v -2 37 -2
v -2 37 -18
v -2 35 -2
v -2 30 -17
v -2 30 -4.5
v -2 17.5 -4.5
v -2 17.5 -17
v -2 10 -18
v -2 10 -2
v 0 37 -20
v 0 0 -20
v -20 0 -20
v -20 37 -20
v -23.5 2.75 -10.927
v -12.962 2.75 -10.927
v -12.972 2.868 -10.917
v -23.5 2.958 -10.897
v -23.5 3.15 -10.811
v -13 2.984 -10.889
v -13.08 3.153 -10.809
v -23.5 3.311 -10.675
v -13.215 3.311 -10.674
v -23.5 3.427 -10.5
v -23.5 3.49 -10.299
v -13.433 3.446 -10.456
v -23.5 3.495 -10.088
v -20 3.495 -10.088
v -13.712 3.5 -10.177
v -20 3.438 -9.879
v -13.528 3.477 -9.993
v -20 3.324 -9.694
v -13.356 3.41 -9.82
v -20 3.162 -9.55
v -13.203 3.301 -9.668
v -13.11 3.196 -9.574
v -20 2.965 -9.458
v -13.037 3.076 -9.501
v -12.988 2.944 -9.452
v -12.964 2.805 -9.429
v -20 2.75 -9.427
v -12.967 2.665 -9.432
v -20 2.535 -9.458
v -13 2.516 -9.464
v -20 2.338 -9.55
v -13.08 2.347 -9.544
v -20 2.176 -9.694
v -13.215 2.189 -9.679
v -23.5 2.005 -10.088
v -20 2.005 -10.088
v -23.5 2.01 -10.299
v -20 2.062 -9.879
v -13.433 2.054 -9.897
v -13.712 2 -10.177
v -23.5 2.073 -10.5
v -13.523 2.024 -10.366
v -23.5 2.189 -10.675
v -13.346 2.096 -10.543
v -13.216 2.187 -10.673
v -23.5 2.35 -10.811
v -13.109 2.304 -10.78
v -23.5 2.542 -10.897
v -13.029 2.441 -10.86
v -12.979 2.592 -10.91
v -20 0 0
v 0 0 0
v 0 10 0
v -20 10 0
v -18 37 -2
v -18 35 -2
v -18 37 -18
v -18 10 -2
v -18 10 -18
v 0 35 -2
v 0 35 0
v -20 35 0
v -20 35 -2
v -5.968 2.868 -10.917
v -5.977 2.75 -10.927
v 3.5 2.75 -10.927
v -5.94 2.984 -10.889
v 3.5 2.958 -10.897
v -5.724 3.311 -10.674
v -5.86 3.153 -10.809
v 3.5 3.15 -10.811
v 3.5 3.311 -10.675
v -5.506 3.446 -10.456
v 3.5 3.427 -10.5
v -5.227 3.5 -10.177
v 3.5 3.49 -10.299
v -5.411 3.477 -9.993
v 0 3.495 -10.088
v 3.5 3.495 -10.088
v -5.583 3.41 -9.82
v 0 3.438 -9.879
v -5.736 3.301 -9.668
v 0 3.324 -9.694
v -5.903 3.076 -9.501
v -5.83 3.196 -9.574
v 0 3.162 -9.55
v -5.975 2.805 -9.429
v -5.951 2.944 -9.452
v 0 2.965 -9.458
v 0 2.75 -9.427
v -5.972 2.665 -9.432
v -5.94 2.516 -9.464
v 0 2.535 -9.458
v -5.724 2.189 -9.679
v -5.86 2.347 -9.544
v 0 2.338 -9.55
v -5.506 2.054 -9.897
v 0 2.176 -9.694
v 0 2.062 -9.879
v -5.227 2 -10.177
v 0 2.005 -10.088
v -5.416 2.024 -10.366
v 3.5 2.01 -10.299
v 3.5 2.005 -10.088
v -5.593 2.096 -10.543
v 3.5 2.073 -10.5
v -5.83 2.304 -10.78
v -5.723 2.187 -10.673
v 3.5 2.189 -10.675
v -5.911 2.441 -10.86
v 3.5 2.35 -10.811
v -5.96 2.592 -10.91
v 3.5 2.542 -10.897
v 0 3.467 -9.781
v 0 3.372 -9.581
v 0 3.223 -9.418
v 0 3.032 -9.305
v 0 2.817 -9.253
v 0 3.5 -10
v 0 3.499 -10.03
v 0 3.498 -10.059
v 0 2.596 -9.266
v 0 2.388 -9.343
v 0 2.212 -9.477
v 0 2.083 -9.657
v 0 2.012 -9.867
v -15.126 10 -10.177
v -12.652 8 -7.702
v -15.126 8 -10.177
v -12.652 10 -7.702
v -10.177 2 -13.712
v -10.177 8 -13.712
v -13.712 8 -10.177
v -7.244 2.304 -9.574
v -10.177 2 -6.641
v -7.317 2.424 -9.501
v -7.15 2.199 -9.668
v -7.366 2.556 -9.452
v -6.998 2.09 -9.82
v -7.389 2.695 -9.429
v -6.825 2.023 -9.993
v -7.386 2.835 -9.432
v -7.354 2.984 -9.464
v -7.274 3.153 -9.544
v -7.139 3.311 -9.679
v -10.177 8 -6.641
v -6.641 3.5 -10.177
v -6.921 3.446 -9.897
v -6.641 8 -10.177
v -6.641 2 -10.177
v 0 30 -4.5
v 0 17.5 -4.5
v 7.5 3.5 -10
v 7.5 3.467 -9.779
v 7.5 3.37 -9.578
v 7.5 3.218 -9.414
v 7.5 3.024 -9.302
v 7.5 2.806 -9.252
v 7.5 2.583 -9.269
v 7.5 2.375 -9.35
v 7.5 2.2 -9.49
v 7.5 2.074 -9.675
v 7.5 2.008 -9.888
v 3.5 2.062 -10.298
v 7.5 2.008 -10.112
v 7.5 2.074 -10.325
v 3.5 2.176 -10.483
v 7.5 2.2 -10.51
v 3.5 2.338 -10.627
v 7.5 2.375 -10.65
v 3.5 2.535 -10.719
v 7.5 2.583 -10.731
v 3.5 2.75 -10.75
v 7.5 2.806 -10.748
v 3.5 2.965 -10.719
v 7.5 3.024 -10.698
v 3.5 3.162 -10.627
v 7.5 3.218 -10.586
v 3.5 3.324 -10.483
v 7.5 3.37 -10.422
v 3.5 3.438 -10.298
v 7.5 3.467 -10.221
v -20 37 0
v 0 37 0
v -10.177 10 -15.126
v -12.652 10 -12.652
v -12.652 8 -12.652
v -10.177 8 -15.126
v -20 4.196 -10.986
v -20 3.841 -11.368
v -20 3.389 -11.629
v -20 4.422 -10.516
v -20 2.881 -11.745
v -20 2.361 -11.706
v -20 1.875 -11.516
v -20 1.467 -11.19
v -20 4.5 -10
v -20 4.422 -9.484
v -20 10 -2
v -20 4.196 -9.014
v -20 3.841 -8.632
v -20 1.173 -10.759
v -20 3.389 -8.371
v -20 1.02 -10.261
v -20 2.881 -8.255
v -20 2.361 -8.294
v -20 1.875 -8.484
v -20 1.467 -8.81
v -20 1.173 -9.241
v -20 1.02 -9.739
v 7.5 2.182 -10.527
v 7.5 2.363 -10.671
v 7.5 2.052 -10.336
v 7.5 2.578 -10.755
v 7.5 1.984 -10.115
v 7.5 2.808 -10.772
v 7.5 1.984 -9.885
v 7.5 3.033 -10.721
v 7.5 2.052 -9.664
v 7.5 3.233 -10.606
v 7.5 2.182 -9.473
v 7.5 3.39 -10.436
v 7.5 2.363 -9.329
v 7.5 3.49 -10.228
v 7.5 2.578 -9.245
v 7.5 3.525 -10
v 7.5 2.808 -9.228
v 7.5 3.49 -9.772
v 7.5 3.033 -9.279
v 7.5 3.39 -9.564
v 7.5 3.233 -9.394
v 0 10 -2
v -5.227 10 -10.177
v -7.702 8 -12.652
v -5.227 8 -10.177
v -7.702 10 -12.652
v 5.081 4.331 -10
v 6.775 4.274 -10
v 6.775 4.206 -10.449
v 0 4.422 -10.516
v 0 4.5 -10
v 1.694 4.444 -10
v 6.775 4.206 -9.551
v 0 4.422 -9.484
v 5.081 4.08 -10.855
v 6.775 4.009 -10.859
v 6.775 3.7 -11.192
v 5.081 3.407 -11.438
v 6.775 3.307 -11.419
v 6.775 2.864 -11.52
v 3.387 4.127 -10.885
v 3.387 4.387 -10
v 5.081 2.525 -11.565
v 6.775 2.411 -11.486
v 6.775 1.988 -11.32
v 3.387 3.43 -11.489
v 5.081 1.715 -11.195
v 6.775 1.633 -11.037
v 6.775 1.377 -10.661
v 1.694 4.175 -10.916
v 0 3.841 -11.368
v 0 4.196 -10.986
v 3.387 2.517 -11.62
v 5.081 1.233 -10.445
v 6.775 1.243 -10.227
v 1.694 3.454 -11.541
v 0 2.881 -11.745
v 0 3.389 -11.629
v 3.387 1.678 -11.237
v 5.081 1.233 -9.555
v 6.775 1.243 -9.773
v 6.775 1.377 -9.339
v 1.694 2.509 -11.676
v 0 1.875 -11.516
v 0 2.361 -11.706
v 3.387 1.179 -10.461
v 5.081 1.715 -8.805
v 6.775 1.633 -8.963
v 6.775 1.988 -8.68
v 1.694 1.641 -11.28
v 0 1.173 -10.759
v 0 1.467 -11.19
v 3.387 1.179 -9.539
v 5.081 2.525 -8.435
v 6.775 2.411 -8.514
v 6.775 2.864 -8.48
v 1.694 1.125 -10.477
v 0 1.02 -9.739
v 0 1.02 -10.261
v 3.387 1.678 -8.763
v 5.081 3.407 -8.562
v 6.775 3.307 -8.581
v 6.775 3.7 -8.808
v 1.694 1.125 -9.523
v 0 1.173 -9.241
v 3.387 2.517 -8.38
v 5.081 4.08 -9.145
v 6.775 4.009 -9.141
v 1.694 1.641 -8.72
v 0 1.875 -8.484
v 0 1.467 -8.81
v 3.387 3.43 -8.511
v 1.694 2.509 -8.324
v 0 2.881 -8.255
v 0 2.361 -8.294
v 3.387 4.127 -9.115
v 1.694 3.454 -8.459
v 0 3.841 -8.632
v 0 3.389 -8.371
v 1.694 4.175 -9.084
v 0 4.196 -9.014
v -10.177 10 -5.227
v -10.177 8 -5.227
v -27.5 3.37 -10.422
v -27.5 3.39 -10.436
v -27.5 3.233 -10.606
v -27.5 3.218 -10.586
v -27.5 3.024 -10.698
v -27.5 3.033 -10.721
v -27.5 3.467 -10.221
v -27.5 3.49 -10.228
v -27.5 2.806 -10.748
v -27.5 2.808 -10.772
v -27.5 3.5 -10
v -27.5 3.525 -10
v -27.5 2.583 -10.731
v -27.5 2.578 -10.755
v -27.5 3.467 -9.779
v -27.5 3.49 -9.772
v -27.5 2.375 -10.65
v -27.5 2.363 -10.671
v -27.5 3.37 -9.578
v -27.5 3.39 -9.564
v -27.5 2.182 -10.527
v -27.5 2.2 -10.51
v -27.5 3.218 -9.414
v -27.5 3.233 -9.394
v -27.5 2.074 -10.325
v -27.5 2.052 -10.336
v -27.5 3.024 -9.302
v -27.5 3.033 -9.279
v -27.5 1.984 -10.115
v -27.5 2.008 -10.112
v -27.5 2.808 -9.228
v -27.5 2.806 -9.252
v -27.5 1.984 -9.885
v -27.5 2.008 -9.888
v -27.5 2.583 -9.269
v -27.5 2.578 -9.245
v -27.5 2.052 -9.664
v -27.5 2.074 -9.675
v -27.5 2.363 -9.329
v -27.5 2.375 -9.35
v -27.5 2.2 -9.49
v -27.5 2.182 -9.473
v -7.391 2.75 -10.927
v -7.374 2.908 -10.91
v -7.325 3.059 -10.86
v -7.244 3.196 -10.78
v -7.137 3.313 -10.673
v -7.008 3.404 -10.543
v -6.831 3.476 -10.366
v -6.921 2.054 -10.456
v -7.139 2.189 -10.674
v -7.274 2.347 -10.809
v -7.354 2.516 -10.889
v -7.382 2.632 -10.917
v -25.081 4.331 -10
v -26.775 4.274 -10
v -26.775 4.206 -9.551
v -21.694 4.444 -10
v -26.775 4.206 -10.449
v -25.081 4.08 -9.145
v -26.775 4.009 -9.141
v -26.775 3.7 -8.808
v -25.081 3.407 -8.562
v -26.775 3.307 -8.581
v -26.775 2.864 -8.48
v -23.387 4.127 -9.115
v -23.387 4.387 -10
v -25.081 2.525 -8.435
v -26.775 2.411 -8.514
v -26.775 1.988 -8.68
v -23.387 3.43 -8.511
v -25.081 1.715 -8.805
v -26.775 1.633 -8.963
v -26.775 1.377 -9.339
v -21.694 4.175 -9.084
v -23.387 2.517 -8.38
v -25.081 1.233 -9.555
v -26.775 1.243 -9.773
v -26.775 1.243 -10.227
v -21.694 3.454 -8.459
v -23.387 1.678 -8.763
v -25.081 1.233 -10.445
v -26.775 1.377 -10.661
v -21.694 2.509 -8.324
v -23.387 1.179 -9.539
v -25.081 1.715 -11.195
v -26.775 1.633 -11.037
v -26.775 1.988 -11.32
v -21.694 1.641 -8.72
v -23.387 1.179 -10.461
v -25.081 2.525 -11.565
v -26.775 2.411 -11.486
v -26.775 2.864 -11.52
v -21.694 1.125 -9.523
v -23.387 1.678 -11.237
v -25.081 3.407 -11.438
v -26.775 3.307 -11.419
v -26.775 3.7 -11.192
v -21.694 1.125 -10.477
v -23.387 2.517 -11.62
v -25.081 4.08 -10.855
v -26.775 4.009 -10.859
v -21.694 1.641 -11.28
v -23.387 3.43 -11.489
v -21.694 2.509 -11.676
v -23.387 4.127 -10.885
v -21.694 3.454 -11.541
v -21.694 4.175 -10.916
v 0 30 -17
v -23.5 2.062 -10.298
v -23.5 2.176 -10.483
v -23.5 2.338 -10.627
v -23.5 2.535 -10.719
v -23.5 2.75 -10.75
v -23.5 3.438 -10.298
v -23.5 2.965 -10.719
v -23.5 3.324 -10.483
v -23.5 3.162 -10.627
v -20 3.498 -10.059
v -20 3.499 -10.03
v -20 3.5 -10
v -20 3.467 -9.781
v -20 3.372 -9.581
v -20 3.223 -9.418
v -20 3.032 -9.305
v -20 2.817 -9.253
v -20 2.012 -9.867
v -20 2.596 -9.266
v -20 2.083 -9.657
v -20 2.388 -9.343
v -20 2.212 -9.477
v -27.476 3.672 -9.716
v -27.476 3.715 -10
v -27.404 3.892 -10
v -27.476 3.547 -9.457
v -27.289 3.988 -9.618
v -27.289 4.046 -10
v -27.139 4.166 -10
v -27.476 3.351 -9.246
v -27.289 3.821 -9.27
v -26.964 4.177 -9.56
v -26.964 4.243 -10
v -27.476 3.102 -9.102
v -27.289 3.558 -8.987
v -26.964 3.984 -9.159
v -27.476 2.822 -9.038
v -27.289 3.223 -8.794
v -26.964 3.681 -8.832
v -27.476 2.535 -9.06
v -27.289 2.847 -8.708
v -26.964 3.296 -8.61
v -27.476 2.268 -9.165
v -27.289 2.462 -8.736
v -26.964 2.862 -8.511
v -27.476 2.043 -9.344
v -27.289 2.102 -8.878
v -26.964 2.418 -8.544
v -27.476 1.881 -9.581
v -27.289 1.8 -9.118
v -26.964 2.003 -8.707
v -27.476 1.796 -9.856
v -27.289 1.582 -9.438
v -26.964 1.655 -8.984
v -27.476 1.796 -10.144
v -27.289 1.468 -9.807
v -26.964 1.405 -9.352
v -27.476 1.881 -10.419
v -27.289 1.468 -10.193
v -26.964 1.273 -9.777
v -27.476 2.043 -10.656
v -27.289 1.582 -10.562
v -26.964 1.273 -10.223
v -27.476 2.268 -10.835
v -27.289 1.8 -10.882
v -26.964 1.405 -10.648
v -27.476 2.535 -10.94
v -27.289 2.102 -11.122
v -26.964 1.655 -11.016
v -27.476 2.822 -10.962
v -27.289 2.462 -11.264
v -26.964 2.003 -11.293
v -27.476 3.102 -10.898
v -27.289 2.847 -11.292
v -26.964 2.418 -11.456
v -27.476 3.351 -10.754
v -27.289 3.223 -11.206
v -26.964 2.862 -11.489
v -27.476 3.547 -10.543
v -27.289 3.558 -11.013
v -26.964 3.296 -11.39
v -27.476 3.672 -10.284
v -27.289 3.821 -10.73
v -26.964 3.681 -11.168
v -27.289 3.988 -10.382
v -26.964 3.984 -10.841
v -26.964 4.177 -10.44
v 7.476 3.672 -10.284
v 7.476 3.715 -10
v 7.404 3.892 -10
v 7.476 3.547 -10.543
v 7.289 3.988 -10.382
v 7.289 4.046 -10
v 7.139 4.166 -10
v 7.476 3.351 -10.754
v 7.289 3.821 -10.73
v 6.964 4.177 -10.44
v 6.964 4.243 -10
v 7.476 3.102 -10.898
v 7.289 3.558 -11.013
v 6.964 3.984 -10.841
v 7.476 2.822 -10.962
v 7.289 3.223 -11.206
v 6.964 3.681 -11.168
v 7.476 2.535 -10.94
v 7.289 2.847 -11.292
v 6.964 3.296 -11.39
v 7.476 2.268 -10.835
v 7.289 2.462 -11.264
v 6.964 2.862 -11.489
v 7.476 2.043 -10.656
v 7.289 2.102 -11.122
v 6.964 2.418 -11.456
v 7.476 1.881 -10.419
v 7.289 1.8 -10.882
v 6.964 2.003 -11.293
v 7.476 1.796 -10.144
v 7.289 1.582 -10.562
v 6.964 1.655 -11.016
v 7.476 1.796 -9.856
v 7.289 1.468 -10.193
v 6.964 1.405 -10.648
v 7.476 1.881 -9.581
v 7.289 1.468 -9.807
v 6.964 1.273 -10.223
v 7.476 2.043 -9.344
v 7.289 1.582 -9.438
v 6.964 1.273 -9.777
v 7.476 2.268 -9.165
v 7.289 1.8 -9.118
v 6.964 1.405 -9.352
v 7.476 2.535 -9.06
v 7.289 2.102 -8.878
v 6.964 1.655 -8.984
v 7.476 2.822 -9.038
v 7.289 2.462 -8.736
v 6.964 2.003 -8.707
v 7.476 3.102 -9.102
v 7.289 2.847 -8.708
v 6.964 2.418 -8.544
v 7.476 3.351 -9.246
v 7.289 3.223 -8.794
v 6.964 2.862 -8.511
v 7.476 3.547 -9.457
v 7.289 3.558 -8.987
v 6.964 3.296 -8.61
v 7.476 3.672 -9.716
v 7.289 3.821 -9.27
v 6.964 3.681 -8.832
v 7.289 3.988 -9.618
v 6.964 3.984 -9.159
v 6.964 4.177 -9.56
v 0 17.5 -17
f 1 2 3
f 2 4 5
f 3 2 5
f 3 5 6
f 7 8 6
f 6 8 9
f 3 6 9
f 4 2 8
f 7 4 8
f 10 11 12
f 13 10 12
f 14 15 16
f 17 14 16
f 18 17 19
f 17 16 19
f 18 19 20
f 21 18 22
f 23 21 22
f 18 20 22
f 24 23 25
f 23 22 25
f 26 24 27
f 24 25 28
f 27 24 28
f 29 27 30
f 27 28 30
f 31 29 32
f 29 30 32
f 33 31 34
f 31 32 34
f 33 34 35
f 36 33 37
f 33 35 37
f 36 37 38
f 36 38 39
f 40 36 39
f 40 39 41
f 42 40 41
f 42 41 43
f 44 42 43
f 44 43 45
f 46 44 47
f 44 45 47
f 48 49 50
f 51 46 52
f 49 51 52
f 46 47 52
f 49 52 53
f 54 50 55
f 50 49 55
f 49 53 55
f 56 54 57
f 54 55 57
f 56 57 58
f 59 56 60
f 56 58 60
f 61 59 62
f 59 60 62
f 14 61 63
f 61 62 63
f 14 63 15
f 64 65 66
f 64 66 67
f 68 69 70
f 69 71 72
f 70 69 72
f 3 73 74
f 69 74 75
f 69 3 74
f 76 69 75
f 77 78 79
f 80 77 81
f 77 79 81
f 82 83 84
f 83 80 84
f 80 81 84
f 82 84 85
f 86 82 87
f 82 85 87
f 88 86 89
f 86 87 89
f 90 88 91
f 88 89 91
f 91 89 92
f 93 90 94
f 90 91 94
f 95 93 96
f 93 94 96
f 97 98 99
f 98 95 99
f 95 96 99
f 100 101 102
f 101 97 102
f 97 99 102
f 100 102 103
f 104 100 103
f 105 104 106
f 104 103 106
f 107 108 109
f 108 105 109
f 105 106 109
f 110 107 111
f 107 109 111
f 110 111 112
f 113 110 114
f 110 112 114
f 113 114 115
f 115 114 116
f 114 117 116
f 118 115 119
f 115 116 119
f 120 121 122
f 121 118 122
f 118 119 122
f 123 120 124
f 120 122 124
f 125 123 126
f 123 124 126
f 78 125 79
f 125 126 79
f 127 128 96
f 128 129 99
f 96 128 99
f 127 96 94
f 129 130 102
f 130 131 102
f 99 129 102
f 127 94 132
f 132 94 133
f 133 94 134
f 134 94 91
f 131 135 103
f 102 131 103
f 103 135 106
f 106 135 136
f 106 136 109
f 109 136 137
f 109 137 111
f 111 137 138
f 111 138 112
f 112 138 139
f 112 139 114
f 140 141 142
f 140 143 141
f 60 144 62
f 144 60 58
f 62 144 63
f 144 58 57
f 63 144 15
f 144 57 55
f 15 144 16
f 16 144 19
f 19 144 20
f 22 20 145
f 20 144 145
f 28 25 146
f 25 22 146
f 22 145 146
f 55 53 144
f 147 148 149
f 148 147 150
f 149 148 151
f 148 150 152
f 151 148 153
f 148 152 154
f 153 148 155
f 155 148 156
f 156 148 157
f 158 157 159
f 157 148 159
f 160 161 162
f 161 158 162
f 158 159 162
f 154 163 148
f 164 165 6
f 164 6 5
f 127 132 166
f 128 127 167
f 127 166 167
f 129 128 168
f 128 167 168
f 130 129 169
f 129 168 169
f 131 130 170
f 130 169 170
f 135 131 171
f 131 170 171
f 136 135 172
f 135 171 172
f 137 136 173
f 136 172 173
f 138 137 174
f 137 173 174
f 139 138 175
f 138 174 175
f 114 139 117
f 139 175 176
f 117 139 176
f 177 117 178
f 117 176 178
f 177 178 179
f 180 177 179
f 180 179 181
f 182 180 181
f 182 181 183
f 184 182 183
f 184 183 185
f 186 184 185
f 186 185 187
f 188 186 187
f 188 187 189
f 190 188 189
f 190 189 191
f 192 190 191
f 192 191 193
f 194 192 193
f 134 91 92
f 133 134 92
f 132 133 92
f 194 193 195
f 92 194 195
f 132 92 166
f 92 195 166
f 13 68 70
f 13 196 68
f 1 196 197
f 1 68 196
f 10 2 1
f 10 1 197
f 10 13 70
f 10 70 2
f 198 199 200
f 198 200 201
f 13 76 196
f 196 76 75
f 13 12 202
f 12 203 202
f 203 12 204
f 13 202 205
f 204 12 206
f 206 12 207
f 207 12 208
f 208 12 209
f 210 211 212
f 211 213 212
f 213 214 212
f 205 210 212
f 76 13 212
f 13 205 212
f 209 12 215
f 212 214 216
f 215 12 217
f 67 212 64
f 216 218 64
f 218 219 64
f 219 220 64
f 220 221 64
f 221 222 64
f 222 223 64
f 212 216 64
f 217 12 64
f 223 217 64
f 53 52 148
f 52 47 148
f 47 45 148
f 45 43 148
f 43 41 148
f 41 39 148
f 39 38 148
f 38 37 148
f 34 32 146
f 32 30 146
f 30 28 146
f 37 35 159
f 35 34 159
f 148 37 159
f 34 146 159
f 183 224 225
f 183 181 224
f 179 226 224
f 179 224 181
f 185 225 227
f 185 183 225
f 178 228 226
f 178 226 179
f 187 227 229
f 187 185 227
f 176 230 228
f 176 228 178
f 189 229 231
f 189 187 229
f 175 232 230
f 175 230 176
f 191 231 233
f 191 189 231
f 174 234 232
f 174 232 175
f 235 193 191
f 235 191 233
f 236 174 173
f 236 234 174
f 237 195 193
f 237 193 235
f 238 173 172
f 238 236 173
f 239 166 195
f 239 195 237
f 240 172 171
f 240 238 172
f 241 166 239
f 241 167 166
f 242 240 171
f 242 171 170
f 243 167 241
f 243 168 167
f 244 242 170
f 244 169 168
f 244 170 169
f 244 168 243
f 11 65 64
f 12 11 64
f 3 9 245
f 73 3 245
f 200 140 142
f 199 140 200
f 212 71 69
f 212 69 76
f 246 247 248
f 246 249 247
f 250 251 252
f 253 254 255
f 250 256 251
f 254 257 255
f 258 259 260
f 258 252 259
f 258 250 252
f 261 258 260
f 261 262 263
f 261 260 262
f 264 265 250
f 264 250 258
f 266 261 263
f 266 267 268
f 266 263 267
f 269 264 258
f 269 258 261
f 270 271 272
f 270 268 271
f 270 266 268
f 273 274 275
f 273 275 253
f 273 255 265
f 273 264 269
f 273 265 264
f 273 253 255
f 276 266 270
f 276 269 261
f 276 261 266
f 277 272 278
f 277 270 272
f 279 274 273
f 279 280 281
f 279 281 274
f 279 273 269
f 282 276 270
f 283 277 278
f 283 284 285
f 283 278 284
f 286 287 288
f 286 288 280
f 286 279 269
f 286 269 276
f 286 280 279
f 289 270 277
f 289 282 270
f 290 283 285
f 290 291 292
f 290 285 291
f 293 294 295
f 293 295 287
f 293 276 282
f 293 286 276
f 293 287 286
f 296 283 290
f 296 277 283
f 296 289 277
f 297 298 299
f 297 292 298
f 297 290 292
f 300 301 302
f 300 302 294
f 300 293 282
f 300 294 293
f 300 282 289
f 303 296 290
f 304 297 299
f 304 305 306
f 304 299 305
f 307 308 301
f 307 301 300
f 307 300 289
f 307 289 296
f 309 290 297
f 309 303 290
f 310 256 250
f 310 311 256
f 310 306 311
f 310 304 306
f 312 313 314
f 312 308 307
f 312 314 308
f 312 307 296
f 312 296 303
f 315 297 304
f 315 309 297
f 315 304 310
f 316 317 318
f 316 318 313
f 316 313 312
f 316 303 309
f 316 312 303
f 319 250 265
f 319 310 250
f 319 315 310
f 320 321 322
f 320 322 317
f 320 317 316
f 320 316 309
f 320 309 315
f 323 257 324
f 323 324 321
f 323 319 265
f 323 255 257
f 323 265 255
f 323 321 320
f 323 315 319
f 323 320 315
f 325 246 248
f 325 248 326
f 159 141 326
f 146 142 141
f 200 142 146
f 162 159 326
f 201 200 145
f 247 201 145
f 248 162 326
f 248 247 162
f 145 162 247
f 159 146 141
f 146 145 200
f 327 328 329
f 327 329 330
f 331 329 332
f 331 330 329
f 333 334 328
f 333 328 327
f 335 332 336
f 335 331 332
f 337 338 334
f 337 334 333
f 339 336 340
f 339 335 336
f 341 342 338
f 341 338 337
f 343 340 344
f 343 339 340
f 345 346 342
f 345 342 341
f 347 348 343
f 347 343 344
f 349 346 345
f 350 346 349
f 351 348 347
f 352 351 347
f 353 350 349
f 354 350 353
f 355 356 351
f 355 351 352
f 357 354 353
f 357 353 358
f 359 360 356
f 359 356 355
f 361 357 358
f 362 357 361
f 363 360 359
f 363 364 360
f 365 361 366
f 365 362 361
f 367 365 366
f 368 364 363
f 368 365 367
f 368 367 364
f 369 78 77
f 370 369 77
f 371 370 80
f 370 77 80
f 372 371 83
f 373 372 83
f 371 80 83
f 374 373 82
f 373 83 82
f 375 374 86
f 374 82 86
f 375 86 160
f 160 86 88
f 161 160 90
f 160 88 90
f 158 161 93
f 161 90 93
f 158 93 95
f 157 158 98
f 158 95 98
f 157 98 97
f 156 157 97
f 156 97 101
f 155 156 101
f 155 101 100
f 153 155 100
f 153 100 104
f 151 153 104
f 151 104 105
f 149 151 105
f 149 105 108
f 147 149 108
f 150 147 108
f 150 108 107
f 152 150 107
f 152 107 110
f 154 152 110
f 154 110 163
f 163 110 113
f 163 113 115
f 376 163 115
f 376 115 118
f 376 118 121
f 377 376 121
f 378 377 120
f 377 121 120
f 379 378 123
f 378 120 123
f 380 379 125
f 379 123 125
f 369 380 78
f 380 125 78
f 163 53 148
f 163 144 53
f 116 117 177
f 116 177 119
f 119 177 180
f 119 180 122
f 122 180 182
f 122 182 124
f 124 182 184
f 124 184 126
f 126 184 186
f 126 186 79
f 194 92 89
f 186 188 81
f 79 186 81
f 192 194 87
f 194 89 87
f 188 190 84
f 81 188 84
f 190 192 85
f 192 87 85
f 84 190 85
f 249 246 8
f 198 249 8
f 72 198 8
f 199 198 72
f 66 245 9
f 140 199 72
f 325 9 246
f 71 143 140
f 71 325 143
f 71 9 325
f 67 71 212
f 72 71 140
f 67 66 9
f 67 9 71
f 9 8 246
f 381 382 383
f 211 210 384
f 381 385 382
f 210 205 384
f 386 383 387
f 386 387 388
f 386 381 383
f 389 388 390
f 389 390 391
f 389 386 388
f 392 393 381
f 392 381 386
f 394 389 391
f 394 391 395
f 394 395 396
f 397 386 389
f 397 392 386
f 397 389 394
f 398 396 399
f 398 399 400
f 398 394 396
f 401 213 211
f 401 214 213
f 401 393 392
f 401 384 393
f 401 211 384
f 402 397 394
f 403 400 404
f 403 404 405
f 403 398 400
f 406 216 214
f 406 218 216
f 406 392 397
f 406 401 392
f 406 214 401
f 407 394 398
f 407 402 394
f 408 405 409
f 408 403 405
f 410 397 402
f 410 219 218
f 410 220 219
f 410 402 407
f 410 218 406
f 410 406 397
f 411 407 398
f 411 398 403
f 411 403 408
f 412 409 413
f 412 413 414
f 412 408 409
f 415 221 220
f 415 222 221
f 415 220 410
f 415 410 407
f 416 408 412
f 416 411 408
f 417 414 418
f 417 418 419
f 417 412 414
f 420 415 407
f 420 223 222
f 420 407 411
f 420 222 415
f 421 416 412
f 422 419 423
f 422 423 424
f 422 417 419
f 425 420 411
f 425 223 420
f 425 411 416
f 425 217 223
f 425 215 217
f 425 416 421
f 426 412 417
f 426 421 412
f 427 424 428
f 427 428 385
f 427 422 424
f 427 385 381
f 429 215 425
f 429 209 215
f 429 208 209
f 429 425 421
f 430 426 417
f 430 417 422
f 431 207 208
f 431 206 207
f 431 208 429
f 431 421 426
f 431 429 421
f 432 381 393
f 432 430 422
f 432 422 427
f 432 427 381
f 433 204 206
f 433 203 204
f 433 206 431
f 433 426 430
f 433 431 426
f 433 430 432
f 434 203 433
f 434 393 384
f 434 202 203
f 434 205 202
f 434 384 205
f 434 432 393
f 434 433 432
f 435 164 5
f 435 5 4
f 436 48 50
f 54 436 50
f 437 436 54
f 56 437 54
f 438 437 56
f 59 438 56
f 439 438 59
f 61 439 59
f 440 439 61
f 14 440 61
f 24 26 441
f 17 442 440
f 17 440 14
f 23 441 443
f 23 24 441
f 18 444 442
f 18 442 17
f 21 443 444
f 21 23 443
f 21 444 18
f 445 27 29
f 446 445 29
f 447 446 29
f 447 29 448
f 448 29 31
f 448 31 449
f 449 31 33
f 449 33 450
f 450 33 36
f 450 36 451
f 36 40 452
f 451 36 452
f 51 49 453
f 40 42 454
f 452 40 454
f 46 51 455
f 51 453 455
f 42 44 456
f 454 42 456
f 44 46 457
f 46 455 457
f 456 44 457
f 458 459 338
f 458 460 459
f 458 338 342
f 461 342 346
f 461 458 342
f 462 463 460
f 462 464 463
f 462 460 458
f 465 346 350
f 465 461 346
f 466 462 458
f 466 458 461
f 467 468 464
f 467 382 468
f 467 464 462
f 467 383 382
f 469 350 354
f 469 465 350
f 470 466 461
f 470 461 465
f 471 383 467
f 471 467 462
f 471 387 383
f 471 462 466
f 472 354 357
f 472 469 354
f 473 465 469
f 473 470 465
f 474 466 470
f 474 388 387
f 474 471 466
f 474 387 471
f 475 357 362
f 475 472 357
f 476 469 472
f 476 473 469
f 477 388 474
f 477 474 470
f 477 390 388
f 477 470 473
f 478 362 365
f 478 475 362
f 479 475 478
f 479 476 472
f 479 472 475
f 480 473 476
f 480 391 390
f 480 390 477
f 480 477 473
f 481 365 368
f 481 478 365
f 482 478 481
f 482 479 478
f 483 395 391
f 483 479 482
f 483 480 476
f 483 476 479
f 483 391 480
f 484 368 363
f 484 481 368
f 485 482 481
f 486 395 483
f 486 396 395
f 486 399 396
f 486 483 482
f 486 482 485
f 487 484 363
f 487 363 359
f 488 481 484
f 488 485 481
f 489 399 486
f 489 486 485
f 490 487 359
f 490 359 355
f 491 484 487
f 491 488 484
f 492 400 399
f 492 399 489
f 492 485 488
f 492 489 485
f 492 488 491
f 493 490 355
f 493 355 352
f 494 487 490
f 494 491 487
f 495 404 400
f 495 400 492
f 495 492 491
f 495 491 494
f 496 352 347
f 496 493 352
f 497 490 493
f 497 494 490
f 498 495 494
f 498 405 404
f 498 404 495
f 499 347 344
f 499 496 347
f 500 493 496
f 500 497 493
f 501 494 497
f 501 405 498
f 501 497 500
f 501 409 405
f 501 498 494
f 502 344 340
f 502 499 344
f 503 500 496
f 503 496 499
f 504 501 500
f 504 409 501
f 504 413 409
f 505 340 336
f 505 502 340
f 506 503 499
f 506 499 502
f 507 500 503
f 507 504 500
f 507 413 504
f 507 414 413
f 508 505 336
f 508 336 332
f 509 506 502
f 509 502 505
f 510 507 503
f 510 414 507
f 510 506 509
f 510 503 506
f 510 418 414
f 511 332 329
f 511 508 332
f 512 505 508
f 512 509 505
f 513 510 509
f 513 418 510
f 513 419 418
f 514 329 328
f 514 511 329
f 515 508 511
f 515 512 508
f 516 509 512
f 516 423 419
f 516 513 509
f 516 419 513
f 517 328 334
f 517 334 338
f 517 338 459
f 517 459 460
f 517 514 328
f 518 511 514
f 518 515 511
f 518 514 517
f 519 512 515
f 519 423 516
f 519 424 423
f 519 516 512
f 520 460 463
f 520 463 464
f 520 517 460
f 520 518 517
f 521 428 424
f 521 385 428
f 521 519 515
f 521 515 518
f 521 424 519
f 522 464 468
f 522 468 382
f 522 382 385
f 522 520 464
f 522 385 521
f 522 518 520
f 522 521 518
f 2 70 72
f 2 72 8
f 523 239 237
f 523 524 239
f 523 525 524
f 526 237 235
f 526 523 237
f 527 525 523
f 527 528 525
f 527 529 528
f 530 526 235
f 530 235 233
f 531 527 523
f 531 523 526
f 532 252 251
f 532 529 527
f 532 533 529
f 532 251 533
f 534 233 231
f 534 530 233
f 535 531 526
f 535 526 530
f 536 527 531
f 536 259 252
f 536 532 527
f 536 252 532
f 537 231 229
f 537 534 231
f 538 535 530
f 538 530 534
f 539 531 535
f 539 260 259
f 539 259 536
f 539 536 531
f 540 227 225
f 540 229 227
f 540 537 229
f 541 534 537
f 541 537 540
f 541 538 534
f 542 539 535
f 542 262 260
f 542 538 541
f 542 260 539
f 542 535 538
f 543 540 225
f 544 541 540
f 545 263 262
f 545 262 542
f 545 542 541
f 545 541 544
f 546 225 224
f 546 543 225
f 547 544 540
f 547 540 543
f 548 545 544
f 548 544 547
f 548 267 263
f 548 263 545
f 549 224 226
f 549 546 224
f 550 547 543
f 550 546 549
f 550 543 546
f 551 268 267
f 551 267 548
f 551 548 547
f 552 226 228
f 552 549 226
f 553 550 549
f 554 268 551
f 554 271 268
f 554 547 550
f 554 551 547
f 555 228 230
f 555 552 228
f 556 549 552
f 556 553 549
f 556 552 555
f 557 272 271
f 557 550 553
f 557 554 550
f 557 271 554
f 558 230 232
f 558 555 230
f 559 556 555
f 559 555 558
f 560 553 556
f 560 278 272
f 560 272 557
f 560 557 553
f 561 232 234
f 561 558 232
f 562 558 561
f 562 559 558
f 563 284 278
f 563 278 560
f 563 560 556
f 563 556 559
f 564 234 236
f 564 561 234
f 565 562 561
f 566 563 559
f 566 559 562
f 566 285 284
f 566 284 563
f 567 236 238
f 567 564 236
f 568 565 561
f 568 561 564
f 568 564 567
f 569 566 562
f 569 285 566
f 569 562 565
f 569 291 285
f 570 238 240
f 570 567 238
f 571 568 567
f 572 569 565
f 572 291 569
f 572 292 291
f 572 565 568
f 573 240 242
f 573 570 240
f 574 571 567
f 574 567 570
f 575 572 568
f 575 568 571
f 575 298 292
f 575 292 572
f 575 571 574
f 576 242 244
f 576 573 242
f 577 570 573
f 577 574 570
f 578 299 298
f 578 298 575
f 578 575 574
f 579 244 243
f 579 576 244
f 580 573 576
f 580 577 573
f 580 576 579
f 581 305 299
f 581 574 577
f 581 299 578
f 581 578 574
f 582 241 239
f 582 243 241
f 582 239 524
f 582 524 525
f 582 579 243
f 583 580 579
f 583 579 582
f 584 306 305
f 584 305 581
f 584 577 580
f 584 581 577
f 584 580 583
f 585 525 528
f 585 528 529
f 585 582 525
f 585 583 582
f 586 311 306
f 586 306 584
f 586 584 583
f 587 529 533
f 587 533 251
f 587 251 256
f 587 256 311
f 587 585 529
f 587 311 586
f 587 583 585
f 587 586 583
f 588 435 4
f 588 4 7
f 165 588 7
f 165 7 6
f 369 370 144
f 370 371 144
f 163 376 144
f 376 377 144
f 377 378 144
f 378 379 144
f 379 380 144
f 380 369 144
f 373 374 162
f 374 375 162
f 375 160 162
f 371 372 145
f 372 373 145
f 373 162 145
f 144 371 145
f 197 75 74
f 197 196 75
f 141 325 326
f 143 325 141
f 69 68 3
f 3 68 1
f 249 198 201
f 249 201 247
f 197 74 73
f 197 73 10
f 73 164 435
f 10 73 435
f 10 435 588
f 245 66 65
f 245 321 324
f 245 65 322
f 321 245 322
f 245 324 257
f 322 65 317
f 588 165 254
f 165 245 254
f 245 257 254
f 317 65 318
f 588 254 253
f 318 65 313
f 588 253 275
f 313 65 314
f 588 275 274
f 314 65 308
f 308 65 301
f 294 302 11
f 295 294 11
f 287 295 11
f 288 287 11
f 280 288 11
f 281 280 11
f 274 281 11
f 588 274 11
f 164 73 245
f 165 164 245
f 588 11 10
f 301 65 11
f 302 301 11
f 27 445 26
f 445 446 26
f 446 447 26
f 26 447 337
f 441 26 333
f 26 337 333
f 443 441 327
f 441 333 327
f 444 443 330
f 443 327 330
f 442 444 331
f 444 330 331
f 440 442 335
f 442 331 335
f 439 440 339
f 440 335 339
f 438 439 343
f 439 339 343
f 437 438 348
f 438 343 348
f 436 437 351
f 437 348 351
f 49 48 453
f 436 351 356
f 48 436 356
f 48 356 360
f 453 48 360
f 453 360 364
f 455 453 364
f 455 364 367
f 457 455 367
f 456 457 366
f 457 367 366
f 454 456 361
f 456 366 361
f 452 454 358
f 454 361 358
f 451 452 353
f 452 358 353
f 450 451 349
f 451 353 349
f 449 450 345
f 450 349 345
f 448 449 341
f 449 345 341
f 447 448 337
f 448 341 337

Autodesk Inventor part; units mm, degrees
ref_plane "YZ Plane" through (0, 0, 0) normal (1, 0, 0) x (0, 1, 0)
sketch "Sketch1" plane through (0, 0, 0) normal (0, 1, 0) x (-1, 0, 0)
  line L0 (0, 0) -> (20, 0)
  line L1 (20, 0) -> (20, -20)
  line L2 (20, -20) -> (0, -20)
  line L3 (0, -20) -> (0, 0)
  dimension "d0" = 20
  dimension "d1" = 20
extrude "Extrusion1" add sketch "Sketch1" along normal blind 10
sketch "Sketch4" plane through (0, 10, 0) normal (0, 1, 0) x (1, 0, 0)
  line L0 (0, 20) -> (-20, 20) projected
  line L1 (-20, 20) -> (-20, 0) projected
  line L2 (-20, 0) -> (0, 0) projected
  line L3 (0, 0) -> (0, 20) projected
  line L4 (0, 20) -> (-20, 20) projected
  line L5 (-20, 20) -> (0, 0)
  line L6 (-10.1768, 10.1768) -> (-7.7019, 12.6517)
  line L7 (-7.7019, 12.6517) -> (-5.227, 10.1768)
  line L8 (-5.227, 10.1768) -> (-7.7019, 7.7019)
  line L9 (-7.7019, 7.7019) -> (-10.1768, 10.1768)
  line L10 (-10.1768, 10.1768) -> (-12.6517, 7.7019)
  line L11 (-12.6517, 7.7019) -> (-15.1265, 10.1768)
  line L12 (-15.1265, 10.1768) -> (-12.6517, 12.6517)
  line L13 (-12.6517, 12.6517) -> (-10.1768, 10.1768)
  line L14 (-12.6517, 12.6517) -> (-10.1768, 15.1265)
  line L15 (-10.1768, 15.1265) -> (-7.7019, 12.6517)
  line L16 (-7.7019, 12.6517) -> (-10.1768, 10.1768)
  line L17 (-10.1768, 10.1768) -> (-12.6517, 12.6517)
  line L18 (-12.6517, 7.7019) -> (-10.1768, 10.1768)
  line L19 (-10.1768, 10.1768) -> (-7.7019, 7.7019)
  line L20 (-7.7019, 7.7019) -> (-10.1768, 5.227)
  line L21 (-10.1768, 5.227) -> (-12.6517, 7.7019)
  dimension "d10" = 3.5
  dimension "d11" = 3.5
  dimension "d12" = 3.5
  dimension "d13" = 3.5
extrude "Extrusion3" cut sketch "Sketch4" against normal blind 8 contours L14 L15 L6 L5 | L5 L10 L11 L12 | L20 L21 L10 L5 | L5 L6 L7 L8
sketch "Sketch5" plane through (0, 10, 0) normal (0, 1, 0) x (1, 0, 0)
  line L0 (-5.227, 10.1768) -> (-10.1768, 5.227) projected
  line L1 (-10.1768, 5.227) -> (-15.1265, 10.1768) projected
  line L2 (-15.1265, 10.1768) -> (-10.1768, 15.1265) projected
  line L3 (-10.1768, 15.1265) -> (-5.227, 10.1768) projected
  line L4 (0, 20) -> (-20, 20) projected
  line L5 (-20, 20) -> (-20, 0) projected
  line L6 (-20, 0) -> (0, 0) projected
  line L7 (0, 0) -> (0, 20) projected
  line L8 (-18, 18) -> (-2, 18)
  line L9 (-2, 18) -> (-2, 2)
  line L10 (-2, 2) -> (-18, 2)
  line L11 (-18, 2) -> (-18, 18)
  line L12 (-18, 2) -> (-18, 0)
  line L13 (-2, 2) -> (-2, 0)
  line L14 (-20, 0) -> (0, 0) projected
  line L15 (-18, 2) -> (-20, 2)
  line L16 (-20, 20) -> (-20, 0) projected
  line L17 (-2, 2) -> (0, 2)
  line L18 (0, 0) -> (0, 20) projected
  point P0 (0, 2)
  dimension "d16" = 2
extrude "Extrusion4" add sketch "Sketch5" along normal blind 27 contours L7 L17 L9 L8 L11 L15 L5 L4
ref_plane "Work Plane1" through (-10, 10, -2) normal (1, 0, 0) x (0, 0, -1)
sketch "Sketch6" plane through (-10, 10, -2) normal (1, 0, 0) x (0, 0, -1)
  line L0 (3.227, 0) -> (8.1768, 0) projected
  line L1 (3.227, 0) -> (3.227, -8) projected
  line L2 (3.227, -8) -> (8.1768, -8) projected
  line L3 (8.1768, 0) -> (8.1768, -8) projected
  line L4 (8.1768, 0) -> (13.1265, 0) projected
  line L5 (8.1768, 0) -> (8.1768, -8) projected
  line L6 (8.1768, -8) -> (13.1265, -8) projected
  line L7 (13.1265, 0) -> (13.1265, -8) projected
  line L8 (16, 0) -> (0, 0) projected
  line L9 (16, 0) -> (16, 27) projected
  line L10 (0, 27) -> (16, 27) projected
  line L11 (0, 0) -> (0, 27) projected
  line L12 (8.1768, 0) -> (8.1768, -8) projected
  line L13 (8.1768, -8) -> (8.1768, -7.25)
  circle A0 centre (8.1768, -7.25) radius 0.75
  point P0 (-2, -10)
  dimension "d20" = 0.75
  dimension "d21" = 1.5
extrude "Extrusion5" cut sketch "Sketch6" along normal mid plane 27 contours A0 L3 | L3 A0
ref_plane "Work Plane2" through (-20, 0, -10) normal (0, 0, 1) x (1, 0, 0)
sketch "Sketch7" plane through (-20, 0, -10) normal (0, 0, 1) x (1, 0, 0)
  line L0 (20, 0) -> (0, 0) projected
  line L1 (0, 0) -> (0, 37) projected
  line L2 (20, 37) -> (0, 37) projected
  line L3 (20, 0) -> (20, 37) projected
  arc A0 (14.773, 3.5) -> (14.773, 2) centre (14.773, 2.75) ccw projected
  arc A1 (14.773, 3.5) -> (14.773, 2) centre (14.773, 2.75) ccw projected
  line L4 (20, 3.5) -> (20, 2) projected
  line L5 (20, 3.5) -> (27.5, 3.5)
  line L6 (27.5, 3.5) -> (27.5, 2)
  line L7 (27.5, 2) -> (20, 2)
  line L8 (20, 2) -> (20, 3.5)
  line L9 (20, 3.5) -> (20, 4.5)
  line L10 (20, 0) -> (20, 37) projected
  line L11 (27.5, 3.5) -> (27.5, 3.5246)
  line L12 (26.775, 4.2742) -> (20, 4.5)
  arc A2 (27.5, 3.5246) -> (26.775, 4.2742) centre (26.75, 3.5246) ccw
  line L13 (20, 3.5) -> (20, 2) projected
  line L14 (20, 2.75) -> (27.5, 2.75)
  point P0 (27.5, 4.25)
  dimension "d25" = 7.5
  dimension "d26" = 1
  dimension "d27" = 0.75
  dimension "d28" = 0.75
revolve "Revolution1" add sketch "Sketch7" angle 360 about axis through (0, 2.75, -10) along (1, 0, 0) contours L3 L12 A2 L11 L5
mirror "Mirror1" about plane through (-10, 10, -2) normal (1, 0, 0) of "Revolution1"
sketch "Sketch8" plane through (-20, 10, -2) normal (0, 0, 1) x (1, 0, 0)
  line L0 (2, 0) -> (0, 0) projected
  line L1 (2, 0) -> (2, 27) projected
  line L2 (0, 27) -> (2, 27) projected
  line L3 (0, 0) -> (0, 27) projected
  line L4 (20, 0) -> (18, 0) projected
  line L5 (20, 0) -> (20, 27) projected
  line L6 (18, 27) -> (20, 27) projected
  line L7 (18, 0) -> (18, 27) projected
  line L8 (20, 27) -> (0, 27) projected
  line L9 (0, 27) -> (20, 27)
  line L10 (20, 27) -> (20, 25)
  line L11 (20, 25) -> (0, 25)
  line L12 (0, 25) -> (0, 27)
  point P0 (20, -10)
  point P1 (0, 25)
  dimension "d30" = 20
  dimension "d31" = 2
extrude "Extrusion6" add sketch "Sketch8" along normal blind 2 contours L11 L3 L2 L1 | L1 L8 L7 L11 | L7 L6 L5 L11
ref_plane "Work Plane3" through (0, 8, 0) normal (0, 1, 0) x (1, 0, 0)
sketch "Sketch9" plane through (0, 8, 0) normal (0, 1, 0) x (1, 0, 0)
  line L0 (-10.1768, 15.1265) -> (-5.227, 10.1768) projected
  line L1 (-15.1265, 10.1768) -> (-10.1768, 15.1265) projected
  line L2 (-10.1768, 5.227) -> (-15.1265, 10.1768) projected
  line L3 (-5.227, 10.1768) -> (-10.1768, 5.227) projected
  line L4 (-6.6412, 10.1768) -> (-10.1768, 13.7123)
  line L5 (-10.1768, 13.7123) -> (-13.7123, 10.1768)
  line L6 (-13.7123, 10.1768) -> (-10.1768, 6.6412)
  line L7 (-10.1768, 6.6412) -> (-6.6412, 10.1768)
  point P0 (0, 0)
  dimension "d35" = 1
extrude "Extrusion7" add sketch "Sketch9" against normal blind 6
extrude "Extrusion8" cut sketch "Sketch6" along normal mid plane 27 contours A0 L3 | L3 A0
sketch "Sketch10" plane through (0, 0, 0) normal (1, 0, 0) x (0, 0, -1)
  line L0 (0, 0) -> (20, 0) projected
  line L1 (20, 0) -> (20, 37) projected
  line L2 (20, 37) -> (0, 37) projected
  line L3 (0, 35) -> (0, 37) projected
  line L4 (2, 35) -> (0, 35) projected
  line L5 (2, 10) -> (2, 35) projected
  line L6 (0, 10) -> (2, 10) projected
  line L7 (0, 0) -> (0, 10) projected
  circle A0 centre (10, 2.75) radius 1.75 projected
  line L8 (2, 35) -> (10, 35)
  line L9 (10, 35) -> (4.5, 35)
  line L10 (4.5, 35) -> (4.5, 30)
  line L11 (4.5, 30) -> (17, 30)
  line L12 (17, 30) -> (17, 17.5)
  line L13 (17, 17.5) -> (4.5, 17.5)
  line L14 (4.5, 17.5) -> (4.5, 30)
  dimension "d40" = 5.5
  dimension "d41" = 5
  dimension "d42" = 12.5
  dimension "d43" = 12.5
  dimension "d44" = 8
extrude "Extrusion9" cut sketch "Sketch10" against normal blind 6 contours L11 L12 L13 L14
properties part number "latticeChamberv4"
